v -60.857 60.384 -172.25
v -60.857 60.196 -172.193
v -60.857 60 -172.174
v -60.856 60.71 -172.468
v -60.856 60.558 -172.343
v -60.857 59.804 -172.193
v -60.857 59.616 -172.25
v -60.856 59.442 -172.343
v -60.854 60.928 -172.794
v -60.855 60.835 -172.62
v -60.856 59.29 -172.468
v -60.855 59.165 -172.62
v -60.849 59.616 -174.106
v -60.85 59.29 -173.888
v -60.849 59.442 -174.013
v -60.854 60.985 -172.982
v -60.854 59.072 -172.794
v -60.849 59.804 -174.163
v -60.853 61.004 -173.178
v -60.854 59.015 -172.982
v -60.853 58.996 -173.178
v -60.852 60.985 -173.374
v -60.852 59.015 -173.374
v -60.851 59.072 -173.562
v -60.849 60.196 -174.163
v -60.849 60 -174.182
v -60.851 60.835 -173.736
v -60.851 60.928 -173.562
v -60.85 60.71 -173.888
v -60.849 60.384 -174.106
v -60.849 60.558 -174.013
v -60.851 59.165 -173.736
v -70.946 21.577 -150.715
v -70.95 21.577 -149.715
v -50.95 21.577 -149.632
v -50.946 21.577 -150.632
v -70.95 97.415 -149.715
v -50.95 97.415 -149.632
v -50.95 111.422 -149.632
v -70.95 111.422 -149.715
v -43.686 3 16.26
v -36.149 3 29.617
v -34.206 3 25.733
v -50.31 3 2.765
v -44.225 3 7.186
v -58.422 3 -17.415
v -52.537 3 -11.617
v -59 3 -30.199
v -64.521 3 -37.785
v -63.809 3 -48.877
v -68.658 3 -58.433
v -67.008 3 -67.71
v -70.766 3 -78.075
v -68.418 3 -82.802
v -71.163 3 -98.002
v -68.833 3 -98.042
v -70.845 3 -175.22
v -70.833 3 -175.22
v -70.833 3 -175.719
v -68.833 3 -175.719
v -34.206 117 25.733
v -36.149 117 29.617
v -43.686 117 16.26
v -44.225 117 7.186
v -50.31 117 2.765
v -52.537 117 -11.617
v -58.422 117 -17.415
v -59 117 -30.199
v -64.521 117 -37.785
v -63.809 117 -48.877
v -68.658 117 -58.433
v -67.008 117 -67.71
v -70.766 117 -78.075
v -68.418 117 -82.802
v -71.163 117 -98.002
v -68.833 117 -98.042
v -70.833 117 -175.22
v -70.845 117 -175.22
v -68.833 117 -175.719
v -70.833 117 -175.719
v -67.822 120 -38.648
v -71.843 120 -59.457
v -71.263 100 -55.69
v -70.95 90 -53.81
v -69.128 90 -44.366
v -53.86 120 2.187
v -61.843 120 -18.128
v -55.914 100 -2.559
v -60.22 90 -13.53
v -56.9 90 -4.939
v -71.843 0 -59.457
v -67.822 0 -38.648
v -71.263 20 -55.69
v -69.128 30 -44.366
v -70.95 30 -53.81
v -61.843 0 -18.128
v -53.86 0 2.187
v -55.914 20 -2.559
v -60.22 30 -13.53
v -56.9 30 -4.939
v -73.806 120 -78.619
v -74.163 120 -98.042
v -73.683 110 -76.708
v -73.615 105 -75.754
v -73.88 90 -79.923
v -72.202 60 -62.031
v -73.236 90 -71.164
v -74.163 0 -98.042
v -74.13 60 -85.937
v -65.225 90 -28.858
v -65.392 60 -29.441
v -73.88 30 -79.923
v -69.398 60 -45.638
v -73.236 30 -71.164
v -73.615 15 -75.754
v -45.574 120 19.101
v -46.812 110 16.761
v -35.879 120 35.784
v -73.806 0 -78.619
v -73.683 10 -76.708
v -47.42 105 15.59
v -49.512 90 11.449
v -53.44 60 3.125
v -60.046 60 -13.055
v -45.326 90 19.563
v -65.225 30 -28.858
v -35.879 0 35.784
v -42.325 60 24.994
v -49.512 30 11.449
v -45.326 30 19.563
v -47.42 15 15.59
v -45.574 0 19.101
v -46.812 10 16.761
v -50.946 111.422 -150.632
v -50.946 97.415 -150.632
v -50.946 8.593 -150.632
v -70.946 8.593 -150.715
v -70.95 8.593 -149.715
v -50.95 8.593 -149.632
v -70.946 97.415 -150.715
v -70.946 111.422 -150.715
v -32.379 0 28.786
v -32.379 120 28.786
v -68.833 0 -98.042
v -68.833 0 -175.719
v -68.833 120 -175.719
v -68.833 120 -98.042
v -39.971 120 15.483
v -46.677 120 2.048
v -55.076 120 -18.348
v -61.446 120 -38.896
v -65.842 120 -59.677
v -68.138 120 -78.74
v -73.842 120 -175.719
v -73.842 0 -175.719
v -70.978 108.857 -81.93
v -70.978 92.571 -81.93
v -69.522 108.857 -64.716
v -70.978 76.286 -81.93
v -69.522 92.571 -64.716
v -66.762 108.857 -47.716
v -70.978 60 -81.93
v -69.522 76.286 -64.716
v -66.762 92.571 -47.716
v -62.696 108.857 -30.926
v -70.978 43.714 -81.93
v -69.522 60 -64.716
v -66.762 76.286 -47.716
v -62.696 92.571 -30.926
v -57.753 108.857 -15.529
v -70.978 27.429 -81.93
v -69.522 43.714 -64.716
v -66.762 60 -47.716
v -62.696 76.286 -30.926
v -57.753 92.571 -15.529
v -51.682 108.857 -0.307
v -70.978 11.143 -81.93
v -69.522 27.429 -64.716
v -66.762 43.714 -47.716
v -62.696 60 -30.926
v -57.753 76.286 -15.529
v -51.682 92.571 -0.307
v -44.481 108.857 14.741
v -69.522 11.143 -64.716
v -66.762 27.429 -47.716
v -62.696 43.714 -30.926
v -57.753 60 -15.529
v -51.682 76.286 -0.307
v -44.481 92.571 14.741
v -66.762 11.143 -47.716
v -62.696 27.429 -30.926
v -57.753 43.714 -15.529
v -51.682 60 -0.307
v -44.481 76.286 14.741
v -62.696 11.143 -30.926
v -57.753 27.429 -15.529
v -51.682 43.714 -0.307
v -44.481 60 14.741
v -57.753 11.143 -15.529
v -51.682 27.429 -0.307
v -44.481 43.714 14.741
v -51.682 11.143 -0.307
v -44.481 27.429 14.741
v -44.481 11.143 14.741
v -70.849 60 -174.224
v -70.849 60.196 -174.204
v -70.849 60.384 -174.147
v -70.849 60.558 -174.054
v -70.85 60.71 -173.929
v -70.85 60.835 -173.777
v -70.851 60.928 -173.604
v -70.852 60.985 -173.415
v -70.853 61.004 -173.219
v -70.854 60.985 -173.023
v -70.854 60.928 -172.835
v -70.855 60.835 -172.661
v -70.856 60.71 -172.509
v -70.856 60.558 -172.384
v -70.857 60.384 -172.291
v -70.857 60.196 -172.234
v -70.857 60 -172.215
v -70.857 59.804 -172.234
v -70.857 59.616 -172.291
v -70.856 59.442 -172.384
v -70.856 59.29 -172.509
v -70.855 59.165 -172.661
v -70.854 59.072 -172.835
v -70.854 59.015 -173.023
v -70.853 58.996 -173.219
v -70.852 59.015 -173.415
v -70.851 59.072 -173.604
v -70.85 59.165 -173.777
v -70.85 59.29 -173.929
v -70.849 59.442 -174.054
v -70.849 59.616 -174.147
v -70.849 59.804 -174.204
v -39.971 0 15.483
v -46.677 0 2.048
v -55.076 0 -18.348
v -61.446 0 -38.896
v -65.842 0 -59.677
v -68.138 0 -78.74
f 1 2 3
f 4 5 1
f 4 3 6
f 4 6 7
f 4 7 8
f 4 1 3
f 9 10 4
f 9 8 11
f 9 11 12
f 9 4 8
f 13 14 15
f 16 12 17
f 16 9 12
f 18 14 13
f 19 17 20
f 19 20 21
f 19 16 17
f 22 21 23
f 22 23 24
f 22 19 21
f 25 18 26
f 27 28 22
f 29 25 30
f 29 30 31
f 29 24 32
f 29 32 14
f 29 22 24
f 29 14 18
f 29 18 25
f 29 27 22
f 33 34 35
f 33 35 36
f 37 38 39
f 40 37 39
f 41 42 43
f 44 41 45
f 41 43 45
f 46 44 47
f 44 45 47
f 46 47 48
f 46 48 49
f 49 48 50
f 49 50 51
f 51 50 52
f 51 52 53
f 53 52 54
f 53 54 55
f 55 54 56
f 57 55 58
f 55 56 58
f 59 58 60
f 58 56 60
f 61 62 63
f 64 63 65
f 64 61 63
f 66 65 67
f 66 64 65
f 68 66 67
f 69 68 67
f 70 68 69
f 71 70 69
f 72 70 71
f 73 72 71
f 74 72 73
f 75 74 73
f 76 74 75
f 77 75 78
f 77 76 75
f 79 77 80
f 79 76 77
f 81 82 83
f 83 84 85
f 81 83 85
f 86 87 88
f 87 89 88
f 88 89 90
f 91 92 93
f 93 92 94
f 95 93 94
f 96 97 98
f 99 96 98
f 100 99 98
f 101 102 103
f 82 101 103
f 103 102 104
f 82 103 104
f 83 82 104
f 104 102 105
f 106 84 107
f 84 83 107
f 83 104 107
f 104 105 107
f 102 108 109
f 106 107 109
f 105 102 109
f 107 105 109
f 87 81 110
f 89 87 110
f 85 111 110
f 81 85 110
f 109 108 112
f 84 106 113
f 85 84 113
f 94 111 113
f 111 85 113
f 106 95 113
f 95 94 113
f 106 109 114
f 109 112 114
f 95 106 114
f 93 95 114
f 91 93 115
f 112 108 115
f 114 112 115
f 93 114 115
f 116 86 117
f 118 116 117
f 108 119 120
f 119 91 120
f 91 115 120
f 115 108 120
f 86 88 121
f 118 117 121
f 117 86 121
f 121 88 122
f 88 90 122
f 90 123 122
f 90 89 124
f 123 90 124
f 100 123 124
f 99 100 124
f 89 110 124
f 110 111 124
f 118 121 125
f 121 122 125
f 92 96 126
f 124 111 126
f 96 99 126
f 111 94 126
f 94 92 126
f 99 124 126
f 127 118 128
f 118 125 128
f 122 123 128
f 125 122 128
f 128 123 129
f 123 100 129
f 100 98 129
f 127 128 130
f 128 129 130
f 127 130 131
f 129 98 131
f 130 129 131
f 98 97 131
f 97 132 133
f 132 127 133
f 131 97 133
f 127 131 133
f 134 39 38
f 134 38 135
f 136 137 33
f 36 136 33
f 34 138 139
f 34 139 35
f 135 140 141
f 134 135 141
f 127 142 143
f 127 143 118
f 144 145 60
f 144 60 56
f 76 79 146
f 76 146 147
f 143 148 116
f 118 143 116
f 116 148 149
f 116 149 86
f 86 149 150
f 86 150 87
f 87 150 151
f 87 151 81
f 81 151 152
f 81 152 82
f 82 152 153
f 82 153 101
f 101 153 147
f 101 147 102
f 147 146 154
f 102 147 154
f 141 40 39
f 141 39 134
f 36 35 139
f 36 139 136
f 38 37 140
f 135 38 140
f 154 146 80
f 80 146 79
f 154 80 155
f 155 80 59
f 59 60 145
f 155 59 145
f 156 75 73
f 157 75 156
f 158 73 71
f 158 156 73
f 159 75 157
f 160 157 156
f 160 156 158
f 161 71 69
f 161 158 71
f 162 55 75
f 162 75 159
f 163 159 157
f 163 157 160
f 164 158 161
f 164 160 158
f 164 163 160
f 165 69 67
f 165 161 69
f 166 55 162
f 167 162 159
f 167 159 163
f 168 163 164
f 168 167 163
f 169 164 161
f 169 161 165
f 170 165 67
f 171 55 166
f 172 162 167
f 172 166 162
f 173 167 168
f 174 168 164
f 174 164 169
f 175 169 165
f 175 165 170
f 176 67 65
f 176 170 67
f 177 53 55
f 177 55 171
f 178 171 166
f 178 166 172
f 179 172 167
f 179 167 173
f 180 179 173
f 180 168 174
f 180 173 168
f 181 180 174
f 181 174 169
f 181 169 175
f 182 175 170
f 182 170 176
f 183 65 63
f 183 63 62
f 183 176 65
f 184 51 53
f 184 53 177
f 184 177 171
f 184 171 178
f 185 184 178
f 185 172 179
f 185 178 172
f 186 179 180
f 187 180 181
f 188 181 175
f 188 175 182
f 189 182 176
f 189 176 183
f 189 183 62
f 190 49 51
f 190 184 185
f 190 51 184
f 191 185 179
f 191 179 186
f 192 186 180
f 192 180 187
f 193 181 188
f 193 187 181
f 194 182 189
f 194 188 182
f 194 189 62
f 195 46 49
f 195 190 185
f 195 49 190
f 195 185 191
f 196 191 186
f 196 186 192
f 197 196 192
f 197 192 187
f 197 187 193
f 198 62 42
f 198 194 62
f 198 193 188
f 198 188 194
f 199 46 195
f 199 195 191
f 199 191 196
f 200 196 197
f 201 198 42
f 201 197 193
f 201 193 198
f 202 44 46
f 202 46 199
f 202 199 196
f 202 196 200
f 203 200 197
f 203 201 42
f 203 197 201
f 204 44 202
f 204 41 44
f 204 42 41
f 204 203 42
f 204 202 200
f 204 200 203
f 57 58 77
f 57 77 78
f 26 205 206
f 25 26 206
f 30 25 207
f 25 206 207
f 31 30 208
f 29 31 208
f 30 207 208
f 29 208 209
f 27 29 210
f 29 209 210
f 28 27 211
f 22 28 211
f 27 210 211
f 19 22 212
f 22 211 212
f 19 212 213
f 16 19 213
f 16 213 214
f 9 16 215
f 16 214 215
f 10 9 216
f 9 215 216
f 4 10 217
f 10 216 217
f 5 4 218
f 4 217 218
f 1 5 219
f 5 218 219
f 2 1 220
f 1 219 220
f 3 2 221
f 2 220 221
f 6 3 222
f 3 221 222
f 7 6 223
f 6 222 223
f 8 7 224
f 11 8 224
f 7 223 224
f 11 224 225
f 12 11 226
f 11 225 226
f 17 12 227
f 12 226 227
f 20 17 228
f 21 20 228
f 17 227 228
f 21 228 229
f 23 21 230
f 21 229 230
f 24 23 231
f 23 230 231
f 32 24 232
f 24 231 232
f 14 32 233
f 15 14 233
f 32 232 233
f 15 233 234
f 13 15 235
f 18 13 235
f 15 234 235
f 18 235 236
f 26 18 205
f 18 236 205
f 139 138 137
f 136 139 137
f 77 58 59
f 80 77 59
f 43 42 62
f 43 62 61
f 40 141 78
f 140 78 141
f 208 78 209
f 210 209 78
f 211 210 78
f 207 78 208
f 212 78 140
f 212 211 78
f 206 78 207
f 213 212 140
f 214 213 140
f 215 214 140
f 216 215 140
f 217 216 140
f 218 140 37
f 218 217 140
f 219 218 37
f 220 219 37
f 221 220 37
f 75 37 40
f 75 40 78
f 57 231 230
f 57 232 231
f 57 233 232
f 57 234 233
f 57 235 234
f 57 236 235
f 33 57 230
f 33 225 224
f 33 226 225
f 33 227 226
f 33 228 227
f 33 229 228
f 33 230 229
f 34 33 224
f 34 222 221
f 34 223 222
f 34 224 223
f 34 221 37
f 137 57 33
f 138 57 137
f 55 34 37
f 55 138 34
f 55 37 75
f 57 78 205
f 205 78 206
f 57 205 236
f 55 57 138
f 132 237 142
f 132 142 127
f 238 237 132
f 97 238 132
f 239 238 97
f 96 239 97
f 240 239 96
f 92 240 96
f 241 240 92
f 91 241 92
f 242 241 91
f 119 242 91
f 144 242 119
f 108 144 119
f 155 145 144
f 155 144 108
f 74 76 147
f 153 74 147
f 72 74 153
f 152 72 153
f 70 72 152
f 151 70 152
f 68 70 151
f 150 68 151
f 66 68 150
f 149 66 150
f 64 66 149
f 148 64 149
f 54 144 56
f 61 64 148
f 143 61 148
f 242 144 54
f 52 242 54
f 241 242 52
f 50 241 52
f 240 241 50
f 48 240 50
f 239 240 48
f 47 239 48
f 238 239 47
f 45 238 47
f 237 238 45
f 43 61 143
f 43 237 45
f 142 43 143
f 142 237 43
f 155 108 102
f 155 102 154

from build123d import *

# Parameters (mm, degrees)
BOSS_EXTRUDE1_DEPTH = 120
SHELL4_START        = 3
SHELL4_DEPTH        = 114
SKETCH12_W          = 3.498967662
SKETCH12_H          = 114
CUT_EXTRUDE5_DEPTH  = 2
SKETCH9_R           = 1.004458273
BOSS_EXTRUDE5_DEPTH = 10
CUT_EXTRUDE6_DEPTH  = 10
SKETCH14_W          = 1
SKETCH14_H          = 12.98385937
SKETCH14_H_2        = 14.006550136
BOSS_EXTRUDE6_DEPTH = 20


# Read off the part's stored shape, not the designer's step: Shell4
with BuildPart() as part:
    # Sketch1 → Boss-Extrude1 (new body)
    with BuildSketch(Plane(origin=(0, 0, 0), x_dir=(1, 0, 0), z_dir=(0, 1, 0))):
        with BuildLine():
            Line((-74.162924852, 98.042139327), (-73.832168128, 178.220414973))
            Line((-73.832168128, 178.220414973), (-68.833436902, 178.220414973))
            Line((-68.833436902, 178.220414973), (-68.833436902, 98.042139327))
            add(Edge.make_bspline(
                [(-68.833436902, 98.042139327), (-69.18939253, 31.860054141), (-32.378727908, -28.786275828)],
                knots=[0, 0, 0, 1, 1, 1], degree=2))
            Line((-32.378727908, -28.786275828), (-35.878727908, -35.78423441))
            add(Edge.make_bspline(
                [(-74.162924852, 98.042139327), (-75.763847477, 27.752135338), (-35.878727908, -35.78423441)],
                knots=[0, 0, 0, 1, 1, 1], degree=2))
        make_face()
    extrude(amount=BOSS_EXTRUDE1_DEPTH)

    # Shell4 outline → Shell4 (cut)
    with BuildSketch(Plane(origin=(0, 0, 0), x_dir=(1, 0, 0), z_dir=(0, 1, 0)).offset(SHELL4_START)):
        with BuildLine():
            Line((-70.8445184, 175.220414973), (-71.163065765, 98.001792885))
            add(Edge.make_bspline(
                [(-71.163065765, 98.001792885), (-71.16307999, 98.001168327), (-71.163094215, 98.000543769), (-71.16310844, 97.999919211), (-71.163122665, 97.999294653), (-71.16313689, 97.998670095), (-71.163151114, 97.998045537), (-71.163165339, 97.997420979), (-71.163179564, 97.996796421), (-71.163193789, 97.996171862), (-71.163208014, 97.995547304), (-71.163222239, 97.994922746), (-71.163236464, 97.994298188), (-71.163250689, 97.99367363), (-71.163293111, 97.991811054), (-71.163321308, 97.990573036), (-71.163349505, 97.989335018), (-71.163377702, 97.988097001), (-71.163405899, 97.986858982), (-71.163434097, 97.985620965), (-71.163462293, 97.984382945), (-71.163490491, 97.98314493), (-71.163518687, 97.98190691), (-71.163546885, 97.980668893), (-71.163575081, 97.979430874), (-71.163603278, 97.978192857), (-71.163631475, 97.976954838), (-71.163673771, 97.975097811), (-71.16368819, 97.974464701), (-71.163699727, 97.973958392), (-71.163723187, 97.972927066), (-71.163717996, 97.973159219), (-71.163755945, 97.971484687), (-71.163749131, 97.971794066), (-71.163775505, 97.970626161), (-71.163784451, 97.97023953), (-71.163799423, 97.969578445), (-71.163813375, 97.968966514), (-71.163827192, 97.968358956), (-71.163841117, 97.967746949), (-71.163868925, 97.96652446), (-71.163882828, 97.965913216), (-71.163896729, 97.965301972), (-71.163910628, 97.964690728), (-71.163924525, 97.964079485), (-71.163938422, 97.963468242), (-71.163952315, 97.962856999), (-71.163966208, 97.962245757), (-71.163980098, 97.961634515), (-71.163993987, 97.961023273), (-71.164007875, 97.960412031), (-71.16402176, 97.95980079), (-71.164035644, 97.959189549), (-71.164105055, 97.956133346), (-71.164160555, 97.953688388), (-71.16421603, 97.951243436), (-71.164271474, 97.948798484), (-71.164326897, 97.946353546), (-71.164382282, 97.943908598), (-71.164437654, 97.941463673), (-71.164492984, 97.939018734), (-71.164548299, 97.936573815), (-71.164603577, 97.93412889), (-71.164658834, 97.931683976), (-71.16471406, 97.929239064), (-71.16476926, 97.926794157), (-71.164934778, 97.919459451), (-71.165045014, 97.914569665), (-71.165155139, 97.909679898), (-71.165265157, 97.904790149), (-71.165375062, 97.899900419), (-71.165484862, 97.895010708), (-71.165594548, 97.890121015), (-71.165704128, 97.885231341), (-71.165813596, 97.880341685), (-71.165922956, 97.875452049), (-71.166032206, 97.87056243), (-71.166141347, 97.86567283), (-71.166250378, 97.860783249), (-71.166577142, 97.846114561), (-71.166794547, 97.83633551), (-71.167011514, 97.826556534), (-71.167228044, 97.816777632), (-71.167444133, 97.806998804), (-71.167659788, 97.797220051), (-71.167875001, 97.787441372), (-71.16808978, 97.777662768), (-71.168304117, 97.767884237), (-71.168518019, 97.758105782), (-71.168731482, 97.7483274), (-71.168944507, 97.738549093), (-71.169157093, 97.72877086), (-71.170217838, 97.679880069), (-71.171059425, 97.640768626), (-71.171894004, 97.601658372), (-71.172721576, 97.56254931), (-71.173542137, 97.523441433), (-71.174355694, 97.484334754), (-71.175162237, 97.445229255), (-71.175961779, 97.406124956), (-71.176754307, 97.367021836), (-71.177539831, 97.327919914), (-71.178318344, 97.288819177), (-71.179089851, 97.249719631), (-71.179854349, 97.210621274), (-71.183641802, 97.015135438), (-71.186559636, 96.858765798), (-71.189365345, 96.702415187), (-71.192058927, 96.546083598), (-71.194640389, 96.389771034), (-71.197109723, 96.233477481), (-71.199466944, 96.077202952), (-71.201712036, 95.920947426), (-71.203845018, 95.764710916), (-71.205865876, 95.608493406), (-71.207774621, 95.452294903), (-71.20957125, 95.296115396), (-71.211255765, 95.139954887), (-71.215972974, 94.671530339), (-71.21866933, 94.359323281), (-71.220917246, 94.047192171), (-71.222716731, 93.735136985), (-71.224067792, 93.423157694), (-71.224970441, 93.111254278), (-71.225424682, 92.799426705), (-71.22543053, 92.487674957), (-71.224987988, 92.175999001), (-71.224097069, 91.864398817), (-71.222757779, 91.552874376), (-71.220970129, 91.241425656), (-71.218734126, 90.930052628), (-71.210681088, 89.996160551), (-71.203519041, 89.373868515), (-71.194563692, 88.751878946), (-71.183815094, 88.130191631), (-71.171273301, 87.508806354), (-71.156938367, 86.887722903), (-71.140810347, 86.266941062), (-71.122889291, 85.646460617), (-71.103175256, 85.026281355), (-71.081668294, 84.406403059), (-71.058368459, 83.786825518), (-71.033275804, 83.167548515), (-71.006390383, 82.548571838), (-70.920355984, 80.692542137), (-70.855828771, 79.456389412), (-70.784130946, 78.221435319), (-70.70526281, 76.987678074), (-70.619224622, 75.75511588), (-70.52601661, 74.52374694), (-70.425638953, 73.293569436), (-70.318091806, 72.064581558), (-70.20337527, 70.836781468), (-70.081489423, 69.610167339), (-69.952434295, 68.384737319), (-69.816209883, 67.16048956), (-69.672816143, 65.937422197), (-69.221126701, 62.271755688), (-68.891322913, 59.832692682), (-68.532840831, 57.398329004), (-68.145679077, 54.968649529), (-67.729835685, 52.543639338), (-67.285308121, 50.123283736), (-66.812093252, 47.707568223), (-66.310187385, 45.296478532), (-65.779586225, 42.890000586), (-65.220284915, 40.488120539), (-64.632278003, 38.090824743), (-64.015559465, 35.698099773), (-63.370122691, 33.309932408), (-61.444530757, 26.501652756), (-60.094120868, 22.092657129), (-58.644686559, 17.699242409), (-57.096177659, 13.321333259), (-55.448539032, 8.958860031), (-53.701711499, 4.611759301), (-51.855632693, 0.279974273), (-49.910237914, -4.036544954), (-47.865460912, -8.33784126), (-45.721234657, -12.6239505), (-43.477492061, -16.894901644), (-41.134166666, -21.150717052), (-38.691193295, -25.391412877), (-36.148508666, -29.616999611)],
                knots=[-0.000198917, -0.000198917, -0.000198917, -0.000198917, -0.000198917, -0.000198917, -0.000198917, -0.000198917, -0.000198917, -0.000198917, -0.000198917, -0.000198917, -0.000198917, -0.000198917, -0.000198917, -0.000136719, -0.000136719, -0.000136719, -0.000136719, -0.000136719, -0.000136719, -0.000136719, -0.000136719, -0.000136719, -0.000136719, -0.000136719, -0.000136719, -0.000136719, -1.3428e-05, -1.3428e-05, -1.3428e-05, -1.3428e-05, -1.3428e-05, -1.3428e-05, -1.3428e-05, -1.3428e-05, -1.3428e-05, -1.3428e-05, -1.3428e-05, -1.3428e-05, -1.3428e-05, 4.8218e-05, 4.8218e-05, 4.8218e-05, 4.8218e-05, 4.8218e-05, 4.8218e-05, 4.8218e-05, 4.8218e-05, 4.8218e-05, 4.8218e-05, 4.8218e-05, 4.8218e-05, 4.8218e-05, 0.000109863, 0.000109863, 0.000109863, 0.000109863, 0.000109863, 0.000109863, 0.000109863, 0.000109863, 0.000109863, 0.000109863, 0.000109863, 0.000109863, 0.000109863, 0.000356445, 0.000356445, 0.000356445, 0.000356445, 0.000356445, 0.000356445, 0.000356445, 0.000356445, 0.000356445, 0.000356445, 0.000356445, 0.000356445, 0.000356445, 0.000849609, 0.000849609, 0.000849609, 0.000849609, 0.000849609, 0.000849609, 0.000849609, 0.000849609, 0.000849609, 0.000849609, 0.000849609, 0.000849609, 0.000849609, 0.001835937, 0.001835937, 0.001835937, 0.001835937, 0.001835937, 0.001835937, 0.001835937, 0.001835937, 0.001835937, 0.001835937, 0.001835937, 0.001835937, 0.001835937, 0.00578125, 0.00578125, 0.00578125, 0.00578125, 0.00578125, 0.00578125, 0.00578125, 0.00578125, 0.00578125, 0.00578125, 0.00578125, 0.00578125, 0.00578125, 0.0215625, 0.0215625, 0.0215625, 0.0215625, 0.0215625, 0.0215625, 0.0215625, 0.0215625, 0.0215625, 0.0215625, 0.0215625, 0.0215625, 0.0215625, 0.053125, 0.053125, 0.053125, 0.053125, 0.053125, 0.053125, 0.053125, 0.053125, 0.053125, 0.053125, 0.053125, 0.053125, 0.053125, 0.11625, 0.11625, 0.11625, 0.11625, 0.11625, 0.11625, 0.11625, 0.11625, 0.11625, 0.11625, 0.11625, 0.11625, 0.11625, 0.2425, 0.2425, 0.2425, 0.2425, 0.2425, 0.2425, 0.2425, 0.2425, 0.2425, 0.2425, 0.2425, 0.2425, 0.2425, 0.495, 0.495, 0.495, 0.495, 0.495, 0.495, 0.495, 0.495, 0.495, 0.495, 0.495, 0.495, 0.495, 0.963709177, 0.963709177, 0.963709177, 0.963709177, 0.963709177, 0.963709177, 0.963709177, 0.963709177, 0.963709177, 0.963709177, 0.963709177, 0.963709177, 0.963709177, 0.963709177, 0.963709177], degree=14))
            Line((-36.148508666, -29.616999611), (-34.206134458, -25.733384151))
            add(Edge.make_bspline(
                [(-34.206134458, -25.733384151), (-69.180443526, 33.523923752), (-68.833436902, 98.042139327)],
                knots=[0.025140786, 0.025140786, 0.025140786, 1, 1, 1], degree=2))
            Line((-68.833436902, 98.042139327), (-68.833436902, 175.220414973))
            Line((-68.833436902, 175.220414973), (-70.8445184, 175.220414973))
        make_face()
    extrude(amount=SHELL4_DEPTH, mode=Mode.SUBTRACT)

    # Sketch12 → Cut-Extrude5 (cut)
    with BuildSketch(Plane(origin=(-68.833436902, 0, 0), x_dir=(0, 0, -1), z_dir=(1, 0, 0))):
        with Locations((176.969898804, 60)):
            Rectangle(SKETCH12_W, SKETCH12_H)
    extrude(amount=-CUT_EXTRUDE5_DEPTH, mode=Mode.SUBTRACT)

    # Sketch9 → Boss-Extrude5 (add)
    with BuildSketch(Plane(origin=(-71.566131341, 0, -0.295229336), x_dir=(0.004125231010775818, 0, -0.9999914911983541), z_dir=(0.999991491198354, 0, 0.004125231010775817))):
        with Locations((172.925450661, 60)):
            Circle(SKETCH9_R)
    extrude(amount=BOSS_EXTRUDE5_DEPTH)

    # Sketch13 → Cut-Extrude6 (cut)
    with BuildSketch(Plane(origin=(-68.833436902, 0, 0), x_dir=(0, 0, -1), z_dir=(1, 0, 0))):
        Polygon((178.220414973, 120), (175.719029806, 120), (175.719029806, 0), (178.721352067, 0), (178.721352067, 120), align=None)
    extrude(amount=-CUT_EXTRUDE6_DEPTH, mode=Mode.SUBTRACT)

    # Sketch14 → Boss-Extrude6 (add)
    with BuildSketch(Plane(origin=(-71.566131341, 0, -0.295229336), x_dir=(0.004125231010775816, 0, -0.9999914911983541), z_dir=(0.999991491198354, 0, 0.004125231010775815))):
        with Locations((149.920607502, 15.084769689)):
            Rectangle(SKETCH14_W, SKETCH14_H)
        with Locations((149.920607502, 104.418723374)):
            Rectangle(SKETCH14_W, SKETCH14_H_2)
    extrude(amount=BOSS_EXTRUDE6_DEPTH)


solid = part.part
